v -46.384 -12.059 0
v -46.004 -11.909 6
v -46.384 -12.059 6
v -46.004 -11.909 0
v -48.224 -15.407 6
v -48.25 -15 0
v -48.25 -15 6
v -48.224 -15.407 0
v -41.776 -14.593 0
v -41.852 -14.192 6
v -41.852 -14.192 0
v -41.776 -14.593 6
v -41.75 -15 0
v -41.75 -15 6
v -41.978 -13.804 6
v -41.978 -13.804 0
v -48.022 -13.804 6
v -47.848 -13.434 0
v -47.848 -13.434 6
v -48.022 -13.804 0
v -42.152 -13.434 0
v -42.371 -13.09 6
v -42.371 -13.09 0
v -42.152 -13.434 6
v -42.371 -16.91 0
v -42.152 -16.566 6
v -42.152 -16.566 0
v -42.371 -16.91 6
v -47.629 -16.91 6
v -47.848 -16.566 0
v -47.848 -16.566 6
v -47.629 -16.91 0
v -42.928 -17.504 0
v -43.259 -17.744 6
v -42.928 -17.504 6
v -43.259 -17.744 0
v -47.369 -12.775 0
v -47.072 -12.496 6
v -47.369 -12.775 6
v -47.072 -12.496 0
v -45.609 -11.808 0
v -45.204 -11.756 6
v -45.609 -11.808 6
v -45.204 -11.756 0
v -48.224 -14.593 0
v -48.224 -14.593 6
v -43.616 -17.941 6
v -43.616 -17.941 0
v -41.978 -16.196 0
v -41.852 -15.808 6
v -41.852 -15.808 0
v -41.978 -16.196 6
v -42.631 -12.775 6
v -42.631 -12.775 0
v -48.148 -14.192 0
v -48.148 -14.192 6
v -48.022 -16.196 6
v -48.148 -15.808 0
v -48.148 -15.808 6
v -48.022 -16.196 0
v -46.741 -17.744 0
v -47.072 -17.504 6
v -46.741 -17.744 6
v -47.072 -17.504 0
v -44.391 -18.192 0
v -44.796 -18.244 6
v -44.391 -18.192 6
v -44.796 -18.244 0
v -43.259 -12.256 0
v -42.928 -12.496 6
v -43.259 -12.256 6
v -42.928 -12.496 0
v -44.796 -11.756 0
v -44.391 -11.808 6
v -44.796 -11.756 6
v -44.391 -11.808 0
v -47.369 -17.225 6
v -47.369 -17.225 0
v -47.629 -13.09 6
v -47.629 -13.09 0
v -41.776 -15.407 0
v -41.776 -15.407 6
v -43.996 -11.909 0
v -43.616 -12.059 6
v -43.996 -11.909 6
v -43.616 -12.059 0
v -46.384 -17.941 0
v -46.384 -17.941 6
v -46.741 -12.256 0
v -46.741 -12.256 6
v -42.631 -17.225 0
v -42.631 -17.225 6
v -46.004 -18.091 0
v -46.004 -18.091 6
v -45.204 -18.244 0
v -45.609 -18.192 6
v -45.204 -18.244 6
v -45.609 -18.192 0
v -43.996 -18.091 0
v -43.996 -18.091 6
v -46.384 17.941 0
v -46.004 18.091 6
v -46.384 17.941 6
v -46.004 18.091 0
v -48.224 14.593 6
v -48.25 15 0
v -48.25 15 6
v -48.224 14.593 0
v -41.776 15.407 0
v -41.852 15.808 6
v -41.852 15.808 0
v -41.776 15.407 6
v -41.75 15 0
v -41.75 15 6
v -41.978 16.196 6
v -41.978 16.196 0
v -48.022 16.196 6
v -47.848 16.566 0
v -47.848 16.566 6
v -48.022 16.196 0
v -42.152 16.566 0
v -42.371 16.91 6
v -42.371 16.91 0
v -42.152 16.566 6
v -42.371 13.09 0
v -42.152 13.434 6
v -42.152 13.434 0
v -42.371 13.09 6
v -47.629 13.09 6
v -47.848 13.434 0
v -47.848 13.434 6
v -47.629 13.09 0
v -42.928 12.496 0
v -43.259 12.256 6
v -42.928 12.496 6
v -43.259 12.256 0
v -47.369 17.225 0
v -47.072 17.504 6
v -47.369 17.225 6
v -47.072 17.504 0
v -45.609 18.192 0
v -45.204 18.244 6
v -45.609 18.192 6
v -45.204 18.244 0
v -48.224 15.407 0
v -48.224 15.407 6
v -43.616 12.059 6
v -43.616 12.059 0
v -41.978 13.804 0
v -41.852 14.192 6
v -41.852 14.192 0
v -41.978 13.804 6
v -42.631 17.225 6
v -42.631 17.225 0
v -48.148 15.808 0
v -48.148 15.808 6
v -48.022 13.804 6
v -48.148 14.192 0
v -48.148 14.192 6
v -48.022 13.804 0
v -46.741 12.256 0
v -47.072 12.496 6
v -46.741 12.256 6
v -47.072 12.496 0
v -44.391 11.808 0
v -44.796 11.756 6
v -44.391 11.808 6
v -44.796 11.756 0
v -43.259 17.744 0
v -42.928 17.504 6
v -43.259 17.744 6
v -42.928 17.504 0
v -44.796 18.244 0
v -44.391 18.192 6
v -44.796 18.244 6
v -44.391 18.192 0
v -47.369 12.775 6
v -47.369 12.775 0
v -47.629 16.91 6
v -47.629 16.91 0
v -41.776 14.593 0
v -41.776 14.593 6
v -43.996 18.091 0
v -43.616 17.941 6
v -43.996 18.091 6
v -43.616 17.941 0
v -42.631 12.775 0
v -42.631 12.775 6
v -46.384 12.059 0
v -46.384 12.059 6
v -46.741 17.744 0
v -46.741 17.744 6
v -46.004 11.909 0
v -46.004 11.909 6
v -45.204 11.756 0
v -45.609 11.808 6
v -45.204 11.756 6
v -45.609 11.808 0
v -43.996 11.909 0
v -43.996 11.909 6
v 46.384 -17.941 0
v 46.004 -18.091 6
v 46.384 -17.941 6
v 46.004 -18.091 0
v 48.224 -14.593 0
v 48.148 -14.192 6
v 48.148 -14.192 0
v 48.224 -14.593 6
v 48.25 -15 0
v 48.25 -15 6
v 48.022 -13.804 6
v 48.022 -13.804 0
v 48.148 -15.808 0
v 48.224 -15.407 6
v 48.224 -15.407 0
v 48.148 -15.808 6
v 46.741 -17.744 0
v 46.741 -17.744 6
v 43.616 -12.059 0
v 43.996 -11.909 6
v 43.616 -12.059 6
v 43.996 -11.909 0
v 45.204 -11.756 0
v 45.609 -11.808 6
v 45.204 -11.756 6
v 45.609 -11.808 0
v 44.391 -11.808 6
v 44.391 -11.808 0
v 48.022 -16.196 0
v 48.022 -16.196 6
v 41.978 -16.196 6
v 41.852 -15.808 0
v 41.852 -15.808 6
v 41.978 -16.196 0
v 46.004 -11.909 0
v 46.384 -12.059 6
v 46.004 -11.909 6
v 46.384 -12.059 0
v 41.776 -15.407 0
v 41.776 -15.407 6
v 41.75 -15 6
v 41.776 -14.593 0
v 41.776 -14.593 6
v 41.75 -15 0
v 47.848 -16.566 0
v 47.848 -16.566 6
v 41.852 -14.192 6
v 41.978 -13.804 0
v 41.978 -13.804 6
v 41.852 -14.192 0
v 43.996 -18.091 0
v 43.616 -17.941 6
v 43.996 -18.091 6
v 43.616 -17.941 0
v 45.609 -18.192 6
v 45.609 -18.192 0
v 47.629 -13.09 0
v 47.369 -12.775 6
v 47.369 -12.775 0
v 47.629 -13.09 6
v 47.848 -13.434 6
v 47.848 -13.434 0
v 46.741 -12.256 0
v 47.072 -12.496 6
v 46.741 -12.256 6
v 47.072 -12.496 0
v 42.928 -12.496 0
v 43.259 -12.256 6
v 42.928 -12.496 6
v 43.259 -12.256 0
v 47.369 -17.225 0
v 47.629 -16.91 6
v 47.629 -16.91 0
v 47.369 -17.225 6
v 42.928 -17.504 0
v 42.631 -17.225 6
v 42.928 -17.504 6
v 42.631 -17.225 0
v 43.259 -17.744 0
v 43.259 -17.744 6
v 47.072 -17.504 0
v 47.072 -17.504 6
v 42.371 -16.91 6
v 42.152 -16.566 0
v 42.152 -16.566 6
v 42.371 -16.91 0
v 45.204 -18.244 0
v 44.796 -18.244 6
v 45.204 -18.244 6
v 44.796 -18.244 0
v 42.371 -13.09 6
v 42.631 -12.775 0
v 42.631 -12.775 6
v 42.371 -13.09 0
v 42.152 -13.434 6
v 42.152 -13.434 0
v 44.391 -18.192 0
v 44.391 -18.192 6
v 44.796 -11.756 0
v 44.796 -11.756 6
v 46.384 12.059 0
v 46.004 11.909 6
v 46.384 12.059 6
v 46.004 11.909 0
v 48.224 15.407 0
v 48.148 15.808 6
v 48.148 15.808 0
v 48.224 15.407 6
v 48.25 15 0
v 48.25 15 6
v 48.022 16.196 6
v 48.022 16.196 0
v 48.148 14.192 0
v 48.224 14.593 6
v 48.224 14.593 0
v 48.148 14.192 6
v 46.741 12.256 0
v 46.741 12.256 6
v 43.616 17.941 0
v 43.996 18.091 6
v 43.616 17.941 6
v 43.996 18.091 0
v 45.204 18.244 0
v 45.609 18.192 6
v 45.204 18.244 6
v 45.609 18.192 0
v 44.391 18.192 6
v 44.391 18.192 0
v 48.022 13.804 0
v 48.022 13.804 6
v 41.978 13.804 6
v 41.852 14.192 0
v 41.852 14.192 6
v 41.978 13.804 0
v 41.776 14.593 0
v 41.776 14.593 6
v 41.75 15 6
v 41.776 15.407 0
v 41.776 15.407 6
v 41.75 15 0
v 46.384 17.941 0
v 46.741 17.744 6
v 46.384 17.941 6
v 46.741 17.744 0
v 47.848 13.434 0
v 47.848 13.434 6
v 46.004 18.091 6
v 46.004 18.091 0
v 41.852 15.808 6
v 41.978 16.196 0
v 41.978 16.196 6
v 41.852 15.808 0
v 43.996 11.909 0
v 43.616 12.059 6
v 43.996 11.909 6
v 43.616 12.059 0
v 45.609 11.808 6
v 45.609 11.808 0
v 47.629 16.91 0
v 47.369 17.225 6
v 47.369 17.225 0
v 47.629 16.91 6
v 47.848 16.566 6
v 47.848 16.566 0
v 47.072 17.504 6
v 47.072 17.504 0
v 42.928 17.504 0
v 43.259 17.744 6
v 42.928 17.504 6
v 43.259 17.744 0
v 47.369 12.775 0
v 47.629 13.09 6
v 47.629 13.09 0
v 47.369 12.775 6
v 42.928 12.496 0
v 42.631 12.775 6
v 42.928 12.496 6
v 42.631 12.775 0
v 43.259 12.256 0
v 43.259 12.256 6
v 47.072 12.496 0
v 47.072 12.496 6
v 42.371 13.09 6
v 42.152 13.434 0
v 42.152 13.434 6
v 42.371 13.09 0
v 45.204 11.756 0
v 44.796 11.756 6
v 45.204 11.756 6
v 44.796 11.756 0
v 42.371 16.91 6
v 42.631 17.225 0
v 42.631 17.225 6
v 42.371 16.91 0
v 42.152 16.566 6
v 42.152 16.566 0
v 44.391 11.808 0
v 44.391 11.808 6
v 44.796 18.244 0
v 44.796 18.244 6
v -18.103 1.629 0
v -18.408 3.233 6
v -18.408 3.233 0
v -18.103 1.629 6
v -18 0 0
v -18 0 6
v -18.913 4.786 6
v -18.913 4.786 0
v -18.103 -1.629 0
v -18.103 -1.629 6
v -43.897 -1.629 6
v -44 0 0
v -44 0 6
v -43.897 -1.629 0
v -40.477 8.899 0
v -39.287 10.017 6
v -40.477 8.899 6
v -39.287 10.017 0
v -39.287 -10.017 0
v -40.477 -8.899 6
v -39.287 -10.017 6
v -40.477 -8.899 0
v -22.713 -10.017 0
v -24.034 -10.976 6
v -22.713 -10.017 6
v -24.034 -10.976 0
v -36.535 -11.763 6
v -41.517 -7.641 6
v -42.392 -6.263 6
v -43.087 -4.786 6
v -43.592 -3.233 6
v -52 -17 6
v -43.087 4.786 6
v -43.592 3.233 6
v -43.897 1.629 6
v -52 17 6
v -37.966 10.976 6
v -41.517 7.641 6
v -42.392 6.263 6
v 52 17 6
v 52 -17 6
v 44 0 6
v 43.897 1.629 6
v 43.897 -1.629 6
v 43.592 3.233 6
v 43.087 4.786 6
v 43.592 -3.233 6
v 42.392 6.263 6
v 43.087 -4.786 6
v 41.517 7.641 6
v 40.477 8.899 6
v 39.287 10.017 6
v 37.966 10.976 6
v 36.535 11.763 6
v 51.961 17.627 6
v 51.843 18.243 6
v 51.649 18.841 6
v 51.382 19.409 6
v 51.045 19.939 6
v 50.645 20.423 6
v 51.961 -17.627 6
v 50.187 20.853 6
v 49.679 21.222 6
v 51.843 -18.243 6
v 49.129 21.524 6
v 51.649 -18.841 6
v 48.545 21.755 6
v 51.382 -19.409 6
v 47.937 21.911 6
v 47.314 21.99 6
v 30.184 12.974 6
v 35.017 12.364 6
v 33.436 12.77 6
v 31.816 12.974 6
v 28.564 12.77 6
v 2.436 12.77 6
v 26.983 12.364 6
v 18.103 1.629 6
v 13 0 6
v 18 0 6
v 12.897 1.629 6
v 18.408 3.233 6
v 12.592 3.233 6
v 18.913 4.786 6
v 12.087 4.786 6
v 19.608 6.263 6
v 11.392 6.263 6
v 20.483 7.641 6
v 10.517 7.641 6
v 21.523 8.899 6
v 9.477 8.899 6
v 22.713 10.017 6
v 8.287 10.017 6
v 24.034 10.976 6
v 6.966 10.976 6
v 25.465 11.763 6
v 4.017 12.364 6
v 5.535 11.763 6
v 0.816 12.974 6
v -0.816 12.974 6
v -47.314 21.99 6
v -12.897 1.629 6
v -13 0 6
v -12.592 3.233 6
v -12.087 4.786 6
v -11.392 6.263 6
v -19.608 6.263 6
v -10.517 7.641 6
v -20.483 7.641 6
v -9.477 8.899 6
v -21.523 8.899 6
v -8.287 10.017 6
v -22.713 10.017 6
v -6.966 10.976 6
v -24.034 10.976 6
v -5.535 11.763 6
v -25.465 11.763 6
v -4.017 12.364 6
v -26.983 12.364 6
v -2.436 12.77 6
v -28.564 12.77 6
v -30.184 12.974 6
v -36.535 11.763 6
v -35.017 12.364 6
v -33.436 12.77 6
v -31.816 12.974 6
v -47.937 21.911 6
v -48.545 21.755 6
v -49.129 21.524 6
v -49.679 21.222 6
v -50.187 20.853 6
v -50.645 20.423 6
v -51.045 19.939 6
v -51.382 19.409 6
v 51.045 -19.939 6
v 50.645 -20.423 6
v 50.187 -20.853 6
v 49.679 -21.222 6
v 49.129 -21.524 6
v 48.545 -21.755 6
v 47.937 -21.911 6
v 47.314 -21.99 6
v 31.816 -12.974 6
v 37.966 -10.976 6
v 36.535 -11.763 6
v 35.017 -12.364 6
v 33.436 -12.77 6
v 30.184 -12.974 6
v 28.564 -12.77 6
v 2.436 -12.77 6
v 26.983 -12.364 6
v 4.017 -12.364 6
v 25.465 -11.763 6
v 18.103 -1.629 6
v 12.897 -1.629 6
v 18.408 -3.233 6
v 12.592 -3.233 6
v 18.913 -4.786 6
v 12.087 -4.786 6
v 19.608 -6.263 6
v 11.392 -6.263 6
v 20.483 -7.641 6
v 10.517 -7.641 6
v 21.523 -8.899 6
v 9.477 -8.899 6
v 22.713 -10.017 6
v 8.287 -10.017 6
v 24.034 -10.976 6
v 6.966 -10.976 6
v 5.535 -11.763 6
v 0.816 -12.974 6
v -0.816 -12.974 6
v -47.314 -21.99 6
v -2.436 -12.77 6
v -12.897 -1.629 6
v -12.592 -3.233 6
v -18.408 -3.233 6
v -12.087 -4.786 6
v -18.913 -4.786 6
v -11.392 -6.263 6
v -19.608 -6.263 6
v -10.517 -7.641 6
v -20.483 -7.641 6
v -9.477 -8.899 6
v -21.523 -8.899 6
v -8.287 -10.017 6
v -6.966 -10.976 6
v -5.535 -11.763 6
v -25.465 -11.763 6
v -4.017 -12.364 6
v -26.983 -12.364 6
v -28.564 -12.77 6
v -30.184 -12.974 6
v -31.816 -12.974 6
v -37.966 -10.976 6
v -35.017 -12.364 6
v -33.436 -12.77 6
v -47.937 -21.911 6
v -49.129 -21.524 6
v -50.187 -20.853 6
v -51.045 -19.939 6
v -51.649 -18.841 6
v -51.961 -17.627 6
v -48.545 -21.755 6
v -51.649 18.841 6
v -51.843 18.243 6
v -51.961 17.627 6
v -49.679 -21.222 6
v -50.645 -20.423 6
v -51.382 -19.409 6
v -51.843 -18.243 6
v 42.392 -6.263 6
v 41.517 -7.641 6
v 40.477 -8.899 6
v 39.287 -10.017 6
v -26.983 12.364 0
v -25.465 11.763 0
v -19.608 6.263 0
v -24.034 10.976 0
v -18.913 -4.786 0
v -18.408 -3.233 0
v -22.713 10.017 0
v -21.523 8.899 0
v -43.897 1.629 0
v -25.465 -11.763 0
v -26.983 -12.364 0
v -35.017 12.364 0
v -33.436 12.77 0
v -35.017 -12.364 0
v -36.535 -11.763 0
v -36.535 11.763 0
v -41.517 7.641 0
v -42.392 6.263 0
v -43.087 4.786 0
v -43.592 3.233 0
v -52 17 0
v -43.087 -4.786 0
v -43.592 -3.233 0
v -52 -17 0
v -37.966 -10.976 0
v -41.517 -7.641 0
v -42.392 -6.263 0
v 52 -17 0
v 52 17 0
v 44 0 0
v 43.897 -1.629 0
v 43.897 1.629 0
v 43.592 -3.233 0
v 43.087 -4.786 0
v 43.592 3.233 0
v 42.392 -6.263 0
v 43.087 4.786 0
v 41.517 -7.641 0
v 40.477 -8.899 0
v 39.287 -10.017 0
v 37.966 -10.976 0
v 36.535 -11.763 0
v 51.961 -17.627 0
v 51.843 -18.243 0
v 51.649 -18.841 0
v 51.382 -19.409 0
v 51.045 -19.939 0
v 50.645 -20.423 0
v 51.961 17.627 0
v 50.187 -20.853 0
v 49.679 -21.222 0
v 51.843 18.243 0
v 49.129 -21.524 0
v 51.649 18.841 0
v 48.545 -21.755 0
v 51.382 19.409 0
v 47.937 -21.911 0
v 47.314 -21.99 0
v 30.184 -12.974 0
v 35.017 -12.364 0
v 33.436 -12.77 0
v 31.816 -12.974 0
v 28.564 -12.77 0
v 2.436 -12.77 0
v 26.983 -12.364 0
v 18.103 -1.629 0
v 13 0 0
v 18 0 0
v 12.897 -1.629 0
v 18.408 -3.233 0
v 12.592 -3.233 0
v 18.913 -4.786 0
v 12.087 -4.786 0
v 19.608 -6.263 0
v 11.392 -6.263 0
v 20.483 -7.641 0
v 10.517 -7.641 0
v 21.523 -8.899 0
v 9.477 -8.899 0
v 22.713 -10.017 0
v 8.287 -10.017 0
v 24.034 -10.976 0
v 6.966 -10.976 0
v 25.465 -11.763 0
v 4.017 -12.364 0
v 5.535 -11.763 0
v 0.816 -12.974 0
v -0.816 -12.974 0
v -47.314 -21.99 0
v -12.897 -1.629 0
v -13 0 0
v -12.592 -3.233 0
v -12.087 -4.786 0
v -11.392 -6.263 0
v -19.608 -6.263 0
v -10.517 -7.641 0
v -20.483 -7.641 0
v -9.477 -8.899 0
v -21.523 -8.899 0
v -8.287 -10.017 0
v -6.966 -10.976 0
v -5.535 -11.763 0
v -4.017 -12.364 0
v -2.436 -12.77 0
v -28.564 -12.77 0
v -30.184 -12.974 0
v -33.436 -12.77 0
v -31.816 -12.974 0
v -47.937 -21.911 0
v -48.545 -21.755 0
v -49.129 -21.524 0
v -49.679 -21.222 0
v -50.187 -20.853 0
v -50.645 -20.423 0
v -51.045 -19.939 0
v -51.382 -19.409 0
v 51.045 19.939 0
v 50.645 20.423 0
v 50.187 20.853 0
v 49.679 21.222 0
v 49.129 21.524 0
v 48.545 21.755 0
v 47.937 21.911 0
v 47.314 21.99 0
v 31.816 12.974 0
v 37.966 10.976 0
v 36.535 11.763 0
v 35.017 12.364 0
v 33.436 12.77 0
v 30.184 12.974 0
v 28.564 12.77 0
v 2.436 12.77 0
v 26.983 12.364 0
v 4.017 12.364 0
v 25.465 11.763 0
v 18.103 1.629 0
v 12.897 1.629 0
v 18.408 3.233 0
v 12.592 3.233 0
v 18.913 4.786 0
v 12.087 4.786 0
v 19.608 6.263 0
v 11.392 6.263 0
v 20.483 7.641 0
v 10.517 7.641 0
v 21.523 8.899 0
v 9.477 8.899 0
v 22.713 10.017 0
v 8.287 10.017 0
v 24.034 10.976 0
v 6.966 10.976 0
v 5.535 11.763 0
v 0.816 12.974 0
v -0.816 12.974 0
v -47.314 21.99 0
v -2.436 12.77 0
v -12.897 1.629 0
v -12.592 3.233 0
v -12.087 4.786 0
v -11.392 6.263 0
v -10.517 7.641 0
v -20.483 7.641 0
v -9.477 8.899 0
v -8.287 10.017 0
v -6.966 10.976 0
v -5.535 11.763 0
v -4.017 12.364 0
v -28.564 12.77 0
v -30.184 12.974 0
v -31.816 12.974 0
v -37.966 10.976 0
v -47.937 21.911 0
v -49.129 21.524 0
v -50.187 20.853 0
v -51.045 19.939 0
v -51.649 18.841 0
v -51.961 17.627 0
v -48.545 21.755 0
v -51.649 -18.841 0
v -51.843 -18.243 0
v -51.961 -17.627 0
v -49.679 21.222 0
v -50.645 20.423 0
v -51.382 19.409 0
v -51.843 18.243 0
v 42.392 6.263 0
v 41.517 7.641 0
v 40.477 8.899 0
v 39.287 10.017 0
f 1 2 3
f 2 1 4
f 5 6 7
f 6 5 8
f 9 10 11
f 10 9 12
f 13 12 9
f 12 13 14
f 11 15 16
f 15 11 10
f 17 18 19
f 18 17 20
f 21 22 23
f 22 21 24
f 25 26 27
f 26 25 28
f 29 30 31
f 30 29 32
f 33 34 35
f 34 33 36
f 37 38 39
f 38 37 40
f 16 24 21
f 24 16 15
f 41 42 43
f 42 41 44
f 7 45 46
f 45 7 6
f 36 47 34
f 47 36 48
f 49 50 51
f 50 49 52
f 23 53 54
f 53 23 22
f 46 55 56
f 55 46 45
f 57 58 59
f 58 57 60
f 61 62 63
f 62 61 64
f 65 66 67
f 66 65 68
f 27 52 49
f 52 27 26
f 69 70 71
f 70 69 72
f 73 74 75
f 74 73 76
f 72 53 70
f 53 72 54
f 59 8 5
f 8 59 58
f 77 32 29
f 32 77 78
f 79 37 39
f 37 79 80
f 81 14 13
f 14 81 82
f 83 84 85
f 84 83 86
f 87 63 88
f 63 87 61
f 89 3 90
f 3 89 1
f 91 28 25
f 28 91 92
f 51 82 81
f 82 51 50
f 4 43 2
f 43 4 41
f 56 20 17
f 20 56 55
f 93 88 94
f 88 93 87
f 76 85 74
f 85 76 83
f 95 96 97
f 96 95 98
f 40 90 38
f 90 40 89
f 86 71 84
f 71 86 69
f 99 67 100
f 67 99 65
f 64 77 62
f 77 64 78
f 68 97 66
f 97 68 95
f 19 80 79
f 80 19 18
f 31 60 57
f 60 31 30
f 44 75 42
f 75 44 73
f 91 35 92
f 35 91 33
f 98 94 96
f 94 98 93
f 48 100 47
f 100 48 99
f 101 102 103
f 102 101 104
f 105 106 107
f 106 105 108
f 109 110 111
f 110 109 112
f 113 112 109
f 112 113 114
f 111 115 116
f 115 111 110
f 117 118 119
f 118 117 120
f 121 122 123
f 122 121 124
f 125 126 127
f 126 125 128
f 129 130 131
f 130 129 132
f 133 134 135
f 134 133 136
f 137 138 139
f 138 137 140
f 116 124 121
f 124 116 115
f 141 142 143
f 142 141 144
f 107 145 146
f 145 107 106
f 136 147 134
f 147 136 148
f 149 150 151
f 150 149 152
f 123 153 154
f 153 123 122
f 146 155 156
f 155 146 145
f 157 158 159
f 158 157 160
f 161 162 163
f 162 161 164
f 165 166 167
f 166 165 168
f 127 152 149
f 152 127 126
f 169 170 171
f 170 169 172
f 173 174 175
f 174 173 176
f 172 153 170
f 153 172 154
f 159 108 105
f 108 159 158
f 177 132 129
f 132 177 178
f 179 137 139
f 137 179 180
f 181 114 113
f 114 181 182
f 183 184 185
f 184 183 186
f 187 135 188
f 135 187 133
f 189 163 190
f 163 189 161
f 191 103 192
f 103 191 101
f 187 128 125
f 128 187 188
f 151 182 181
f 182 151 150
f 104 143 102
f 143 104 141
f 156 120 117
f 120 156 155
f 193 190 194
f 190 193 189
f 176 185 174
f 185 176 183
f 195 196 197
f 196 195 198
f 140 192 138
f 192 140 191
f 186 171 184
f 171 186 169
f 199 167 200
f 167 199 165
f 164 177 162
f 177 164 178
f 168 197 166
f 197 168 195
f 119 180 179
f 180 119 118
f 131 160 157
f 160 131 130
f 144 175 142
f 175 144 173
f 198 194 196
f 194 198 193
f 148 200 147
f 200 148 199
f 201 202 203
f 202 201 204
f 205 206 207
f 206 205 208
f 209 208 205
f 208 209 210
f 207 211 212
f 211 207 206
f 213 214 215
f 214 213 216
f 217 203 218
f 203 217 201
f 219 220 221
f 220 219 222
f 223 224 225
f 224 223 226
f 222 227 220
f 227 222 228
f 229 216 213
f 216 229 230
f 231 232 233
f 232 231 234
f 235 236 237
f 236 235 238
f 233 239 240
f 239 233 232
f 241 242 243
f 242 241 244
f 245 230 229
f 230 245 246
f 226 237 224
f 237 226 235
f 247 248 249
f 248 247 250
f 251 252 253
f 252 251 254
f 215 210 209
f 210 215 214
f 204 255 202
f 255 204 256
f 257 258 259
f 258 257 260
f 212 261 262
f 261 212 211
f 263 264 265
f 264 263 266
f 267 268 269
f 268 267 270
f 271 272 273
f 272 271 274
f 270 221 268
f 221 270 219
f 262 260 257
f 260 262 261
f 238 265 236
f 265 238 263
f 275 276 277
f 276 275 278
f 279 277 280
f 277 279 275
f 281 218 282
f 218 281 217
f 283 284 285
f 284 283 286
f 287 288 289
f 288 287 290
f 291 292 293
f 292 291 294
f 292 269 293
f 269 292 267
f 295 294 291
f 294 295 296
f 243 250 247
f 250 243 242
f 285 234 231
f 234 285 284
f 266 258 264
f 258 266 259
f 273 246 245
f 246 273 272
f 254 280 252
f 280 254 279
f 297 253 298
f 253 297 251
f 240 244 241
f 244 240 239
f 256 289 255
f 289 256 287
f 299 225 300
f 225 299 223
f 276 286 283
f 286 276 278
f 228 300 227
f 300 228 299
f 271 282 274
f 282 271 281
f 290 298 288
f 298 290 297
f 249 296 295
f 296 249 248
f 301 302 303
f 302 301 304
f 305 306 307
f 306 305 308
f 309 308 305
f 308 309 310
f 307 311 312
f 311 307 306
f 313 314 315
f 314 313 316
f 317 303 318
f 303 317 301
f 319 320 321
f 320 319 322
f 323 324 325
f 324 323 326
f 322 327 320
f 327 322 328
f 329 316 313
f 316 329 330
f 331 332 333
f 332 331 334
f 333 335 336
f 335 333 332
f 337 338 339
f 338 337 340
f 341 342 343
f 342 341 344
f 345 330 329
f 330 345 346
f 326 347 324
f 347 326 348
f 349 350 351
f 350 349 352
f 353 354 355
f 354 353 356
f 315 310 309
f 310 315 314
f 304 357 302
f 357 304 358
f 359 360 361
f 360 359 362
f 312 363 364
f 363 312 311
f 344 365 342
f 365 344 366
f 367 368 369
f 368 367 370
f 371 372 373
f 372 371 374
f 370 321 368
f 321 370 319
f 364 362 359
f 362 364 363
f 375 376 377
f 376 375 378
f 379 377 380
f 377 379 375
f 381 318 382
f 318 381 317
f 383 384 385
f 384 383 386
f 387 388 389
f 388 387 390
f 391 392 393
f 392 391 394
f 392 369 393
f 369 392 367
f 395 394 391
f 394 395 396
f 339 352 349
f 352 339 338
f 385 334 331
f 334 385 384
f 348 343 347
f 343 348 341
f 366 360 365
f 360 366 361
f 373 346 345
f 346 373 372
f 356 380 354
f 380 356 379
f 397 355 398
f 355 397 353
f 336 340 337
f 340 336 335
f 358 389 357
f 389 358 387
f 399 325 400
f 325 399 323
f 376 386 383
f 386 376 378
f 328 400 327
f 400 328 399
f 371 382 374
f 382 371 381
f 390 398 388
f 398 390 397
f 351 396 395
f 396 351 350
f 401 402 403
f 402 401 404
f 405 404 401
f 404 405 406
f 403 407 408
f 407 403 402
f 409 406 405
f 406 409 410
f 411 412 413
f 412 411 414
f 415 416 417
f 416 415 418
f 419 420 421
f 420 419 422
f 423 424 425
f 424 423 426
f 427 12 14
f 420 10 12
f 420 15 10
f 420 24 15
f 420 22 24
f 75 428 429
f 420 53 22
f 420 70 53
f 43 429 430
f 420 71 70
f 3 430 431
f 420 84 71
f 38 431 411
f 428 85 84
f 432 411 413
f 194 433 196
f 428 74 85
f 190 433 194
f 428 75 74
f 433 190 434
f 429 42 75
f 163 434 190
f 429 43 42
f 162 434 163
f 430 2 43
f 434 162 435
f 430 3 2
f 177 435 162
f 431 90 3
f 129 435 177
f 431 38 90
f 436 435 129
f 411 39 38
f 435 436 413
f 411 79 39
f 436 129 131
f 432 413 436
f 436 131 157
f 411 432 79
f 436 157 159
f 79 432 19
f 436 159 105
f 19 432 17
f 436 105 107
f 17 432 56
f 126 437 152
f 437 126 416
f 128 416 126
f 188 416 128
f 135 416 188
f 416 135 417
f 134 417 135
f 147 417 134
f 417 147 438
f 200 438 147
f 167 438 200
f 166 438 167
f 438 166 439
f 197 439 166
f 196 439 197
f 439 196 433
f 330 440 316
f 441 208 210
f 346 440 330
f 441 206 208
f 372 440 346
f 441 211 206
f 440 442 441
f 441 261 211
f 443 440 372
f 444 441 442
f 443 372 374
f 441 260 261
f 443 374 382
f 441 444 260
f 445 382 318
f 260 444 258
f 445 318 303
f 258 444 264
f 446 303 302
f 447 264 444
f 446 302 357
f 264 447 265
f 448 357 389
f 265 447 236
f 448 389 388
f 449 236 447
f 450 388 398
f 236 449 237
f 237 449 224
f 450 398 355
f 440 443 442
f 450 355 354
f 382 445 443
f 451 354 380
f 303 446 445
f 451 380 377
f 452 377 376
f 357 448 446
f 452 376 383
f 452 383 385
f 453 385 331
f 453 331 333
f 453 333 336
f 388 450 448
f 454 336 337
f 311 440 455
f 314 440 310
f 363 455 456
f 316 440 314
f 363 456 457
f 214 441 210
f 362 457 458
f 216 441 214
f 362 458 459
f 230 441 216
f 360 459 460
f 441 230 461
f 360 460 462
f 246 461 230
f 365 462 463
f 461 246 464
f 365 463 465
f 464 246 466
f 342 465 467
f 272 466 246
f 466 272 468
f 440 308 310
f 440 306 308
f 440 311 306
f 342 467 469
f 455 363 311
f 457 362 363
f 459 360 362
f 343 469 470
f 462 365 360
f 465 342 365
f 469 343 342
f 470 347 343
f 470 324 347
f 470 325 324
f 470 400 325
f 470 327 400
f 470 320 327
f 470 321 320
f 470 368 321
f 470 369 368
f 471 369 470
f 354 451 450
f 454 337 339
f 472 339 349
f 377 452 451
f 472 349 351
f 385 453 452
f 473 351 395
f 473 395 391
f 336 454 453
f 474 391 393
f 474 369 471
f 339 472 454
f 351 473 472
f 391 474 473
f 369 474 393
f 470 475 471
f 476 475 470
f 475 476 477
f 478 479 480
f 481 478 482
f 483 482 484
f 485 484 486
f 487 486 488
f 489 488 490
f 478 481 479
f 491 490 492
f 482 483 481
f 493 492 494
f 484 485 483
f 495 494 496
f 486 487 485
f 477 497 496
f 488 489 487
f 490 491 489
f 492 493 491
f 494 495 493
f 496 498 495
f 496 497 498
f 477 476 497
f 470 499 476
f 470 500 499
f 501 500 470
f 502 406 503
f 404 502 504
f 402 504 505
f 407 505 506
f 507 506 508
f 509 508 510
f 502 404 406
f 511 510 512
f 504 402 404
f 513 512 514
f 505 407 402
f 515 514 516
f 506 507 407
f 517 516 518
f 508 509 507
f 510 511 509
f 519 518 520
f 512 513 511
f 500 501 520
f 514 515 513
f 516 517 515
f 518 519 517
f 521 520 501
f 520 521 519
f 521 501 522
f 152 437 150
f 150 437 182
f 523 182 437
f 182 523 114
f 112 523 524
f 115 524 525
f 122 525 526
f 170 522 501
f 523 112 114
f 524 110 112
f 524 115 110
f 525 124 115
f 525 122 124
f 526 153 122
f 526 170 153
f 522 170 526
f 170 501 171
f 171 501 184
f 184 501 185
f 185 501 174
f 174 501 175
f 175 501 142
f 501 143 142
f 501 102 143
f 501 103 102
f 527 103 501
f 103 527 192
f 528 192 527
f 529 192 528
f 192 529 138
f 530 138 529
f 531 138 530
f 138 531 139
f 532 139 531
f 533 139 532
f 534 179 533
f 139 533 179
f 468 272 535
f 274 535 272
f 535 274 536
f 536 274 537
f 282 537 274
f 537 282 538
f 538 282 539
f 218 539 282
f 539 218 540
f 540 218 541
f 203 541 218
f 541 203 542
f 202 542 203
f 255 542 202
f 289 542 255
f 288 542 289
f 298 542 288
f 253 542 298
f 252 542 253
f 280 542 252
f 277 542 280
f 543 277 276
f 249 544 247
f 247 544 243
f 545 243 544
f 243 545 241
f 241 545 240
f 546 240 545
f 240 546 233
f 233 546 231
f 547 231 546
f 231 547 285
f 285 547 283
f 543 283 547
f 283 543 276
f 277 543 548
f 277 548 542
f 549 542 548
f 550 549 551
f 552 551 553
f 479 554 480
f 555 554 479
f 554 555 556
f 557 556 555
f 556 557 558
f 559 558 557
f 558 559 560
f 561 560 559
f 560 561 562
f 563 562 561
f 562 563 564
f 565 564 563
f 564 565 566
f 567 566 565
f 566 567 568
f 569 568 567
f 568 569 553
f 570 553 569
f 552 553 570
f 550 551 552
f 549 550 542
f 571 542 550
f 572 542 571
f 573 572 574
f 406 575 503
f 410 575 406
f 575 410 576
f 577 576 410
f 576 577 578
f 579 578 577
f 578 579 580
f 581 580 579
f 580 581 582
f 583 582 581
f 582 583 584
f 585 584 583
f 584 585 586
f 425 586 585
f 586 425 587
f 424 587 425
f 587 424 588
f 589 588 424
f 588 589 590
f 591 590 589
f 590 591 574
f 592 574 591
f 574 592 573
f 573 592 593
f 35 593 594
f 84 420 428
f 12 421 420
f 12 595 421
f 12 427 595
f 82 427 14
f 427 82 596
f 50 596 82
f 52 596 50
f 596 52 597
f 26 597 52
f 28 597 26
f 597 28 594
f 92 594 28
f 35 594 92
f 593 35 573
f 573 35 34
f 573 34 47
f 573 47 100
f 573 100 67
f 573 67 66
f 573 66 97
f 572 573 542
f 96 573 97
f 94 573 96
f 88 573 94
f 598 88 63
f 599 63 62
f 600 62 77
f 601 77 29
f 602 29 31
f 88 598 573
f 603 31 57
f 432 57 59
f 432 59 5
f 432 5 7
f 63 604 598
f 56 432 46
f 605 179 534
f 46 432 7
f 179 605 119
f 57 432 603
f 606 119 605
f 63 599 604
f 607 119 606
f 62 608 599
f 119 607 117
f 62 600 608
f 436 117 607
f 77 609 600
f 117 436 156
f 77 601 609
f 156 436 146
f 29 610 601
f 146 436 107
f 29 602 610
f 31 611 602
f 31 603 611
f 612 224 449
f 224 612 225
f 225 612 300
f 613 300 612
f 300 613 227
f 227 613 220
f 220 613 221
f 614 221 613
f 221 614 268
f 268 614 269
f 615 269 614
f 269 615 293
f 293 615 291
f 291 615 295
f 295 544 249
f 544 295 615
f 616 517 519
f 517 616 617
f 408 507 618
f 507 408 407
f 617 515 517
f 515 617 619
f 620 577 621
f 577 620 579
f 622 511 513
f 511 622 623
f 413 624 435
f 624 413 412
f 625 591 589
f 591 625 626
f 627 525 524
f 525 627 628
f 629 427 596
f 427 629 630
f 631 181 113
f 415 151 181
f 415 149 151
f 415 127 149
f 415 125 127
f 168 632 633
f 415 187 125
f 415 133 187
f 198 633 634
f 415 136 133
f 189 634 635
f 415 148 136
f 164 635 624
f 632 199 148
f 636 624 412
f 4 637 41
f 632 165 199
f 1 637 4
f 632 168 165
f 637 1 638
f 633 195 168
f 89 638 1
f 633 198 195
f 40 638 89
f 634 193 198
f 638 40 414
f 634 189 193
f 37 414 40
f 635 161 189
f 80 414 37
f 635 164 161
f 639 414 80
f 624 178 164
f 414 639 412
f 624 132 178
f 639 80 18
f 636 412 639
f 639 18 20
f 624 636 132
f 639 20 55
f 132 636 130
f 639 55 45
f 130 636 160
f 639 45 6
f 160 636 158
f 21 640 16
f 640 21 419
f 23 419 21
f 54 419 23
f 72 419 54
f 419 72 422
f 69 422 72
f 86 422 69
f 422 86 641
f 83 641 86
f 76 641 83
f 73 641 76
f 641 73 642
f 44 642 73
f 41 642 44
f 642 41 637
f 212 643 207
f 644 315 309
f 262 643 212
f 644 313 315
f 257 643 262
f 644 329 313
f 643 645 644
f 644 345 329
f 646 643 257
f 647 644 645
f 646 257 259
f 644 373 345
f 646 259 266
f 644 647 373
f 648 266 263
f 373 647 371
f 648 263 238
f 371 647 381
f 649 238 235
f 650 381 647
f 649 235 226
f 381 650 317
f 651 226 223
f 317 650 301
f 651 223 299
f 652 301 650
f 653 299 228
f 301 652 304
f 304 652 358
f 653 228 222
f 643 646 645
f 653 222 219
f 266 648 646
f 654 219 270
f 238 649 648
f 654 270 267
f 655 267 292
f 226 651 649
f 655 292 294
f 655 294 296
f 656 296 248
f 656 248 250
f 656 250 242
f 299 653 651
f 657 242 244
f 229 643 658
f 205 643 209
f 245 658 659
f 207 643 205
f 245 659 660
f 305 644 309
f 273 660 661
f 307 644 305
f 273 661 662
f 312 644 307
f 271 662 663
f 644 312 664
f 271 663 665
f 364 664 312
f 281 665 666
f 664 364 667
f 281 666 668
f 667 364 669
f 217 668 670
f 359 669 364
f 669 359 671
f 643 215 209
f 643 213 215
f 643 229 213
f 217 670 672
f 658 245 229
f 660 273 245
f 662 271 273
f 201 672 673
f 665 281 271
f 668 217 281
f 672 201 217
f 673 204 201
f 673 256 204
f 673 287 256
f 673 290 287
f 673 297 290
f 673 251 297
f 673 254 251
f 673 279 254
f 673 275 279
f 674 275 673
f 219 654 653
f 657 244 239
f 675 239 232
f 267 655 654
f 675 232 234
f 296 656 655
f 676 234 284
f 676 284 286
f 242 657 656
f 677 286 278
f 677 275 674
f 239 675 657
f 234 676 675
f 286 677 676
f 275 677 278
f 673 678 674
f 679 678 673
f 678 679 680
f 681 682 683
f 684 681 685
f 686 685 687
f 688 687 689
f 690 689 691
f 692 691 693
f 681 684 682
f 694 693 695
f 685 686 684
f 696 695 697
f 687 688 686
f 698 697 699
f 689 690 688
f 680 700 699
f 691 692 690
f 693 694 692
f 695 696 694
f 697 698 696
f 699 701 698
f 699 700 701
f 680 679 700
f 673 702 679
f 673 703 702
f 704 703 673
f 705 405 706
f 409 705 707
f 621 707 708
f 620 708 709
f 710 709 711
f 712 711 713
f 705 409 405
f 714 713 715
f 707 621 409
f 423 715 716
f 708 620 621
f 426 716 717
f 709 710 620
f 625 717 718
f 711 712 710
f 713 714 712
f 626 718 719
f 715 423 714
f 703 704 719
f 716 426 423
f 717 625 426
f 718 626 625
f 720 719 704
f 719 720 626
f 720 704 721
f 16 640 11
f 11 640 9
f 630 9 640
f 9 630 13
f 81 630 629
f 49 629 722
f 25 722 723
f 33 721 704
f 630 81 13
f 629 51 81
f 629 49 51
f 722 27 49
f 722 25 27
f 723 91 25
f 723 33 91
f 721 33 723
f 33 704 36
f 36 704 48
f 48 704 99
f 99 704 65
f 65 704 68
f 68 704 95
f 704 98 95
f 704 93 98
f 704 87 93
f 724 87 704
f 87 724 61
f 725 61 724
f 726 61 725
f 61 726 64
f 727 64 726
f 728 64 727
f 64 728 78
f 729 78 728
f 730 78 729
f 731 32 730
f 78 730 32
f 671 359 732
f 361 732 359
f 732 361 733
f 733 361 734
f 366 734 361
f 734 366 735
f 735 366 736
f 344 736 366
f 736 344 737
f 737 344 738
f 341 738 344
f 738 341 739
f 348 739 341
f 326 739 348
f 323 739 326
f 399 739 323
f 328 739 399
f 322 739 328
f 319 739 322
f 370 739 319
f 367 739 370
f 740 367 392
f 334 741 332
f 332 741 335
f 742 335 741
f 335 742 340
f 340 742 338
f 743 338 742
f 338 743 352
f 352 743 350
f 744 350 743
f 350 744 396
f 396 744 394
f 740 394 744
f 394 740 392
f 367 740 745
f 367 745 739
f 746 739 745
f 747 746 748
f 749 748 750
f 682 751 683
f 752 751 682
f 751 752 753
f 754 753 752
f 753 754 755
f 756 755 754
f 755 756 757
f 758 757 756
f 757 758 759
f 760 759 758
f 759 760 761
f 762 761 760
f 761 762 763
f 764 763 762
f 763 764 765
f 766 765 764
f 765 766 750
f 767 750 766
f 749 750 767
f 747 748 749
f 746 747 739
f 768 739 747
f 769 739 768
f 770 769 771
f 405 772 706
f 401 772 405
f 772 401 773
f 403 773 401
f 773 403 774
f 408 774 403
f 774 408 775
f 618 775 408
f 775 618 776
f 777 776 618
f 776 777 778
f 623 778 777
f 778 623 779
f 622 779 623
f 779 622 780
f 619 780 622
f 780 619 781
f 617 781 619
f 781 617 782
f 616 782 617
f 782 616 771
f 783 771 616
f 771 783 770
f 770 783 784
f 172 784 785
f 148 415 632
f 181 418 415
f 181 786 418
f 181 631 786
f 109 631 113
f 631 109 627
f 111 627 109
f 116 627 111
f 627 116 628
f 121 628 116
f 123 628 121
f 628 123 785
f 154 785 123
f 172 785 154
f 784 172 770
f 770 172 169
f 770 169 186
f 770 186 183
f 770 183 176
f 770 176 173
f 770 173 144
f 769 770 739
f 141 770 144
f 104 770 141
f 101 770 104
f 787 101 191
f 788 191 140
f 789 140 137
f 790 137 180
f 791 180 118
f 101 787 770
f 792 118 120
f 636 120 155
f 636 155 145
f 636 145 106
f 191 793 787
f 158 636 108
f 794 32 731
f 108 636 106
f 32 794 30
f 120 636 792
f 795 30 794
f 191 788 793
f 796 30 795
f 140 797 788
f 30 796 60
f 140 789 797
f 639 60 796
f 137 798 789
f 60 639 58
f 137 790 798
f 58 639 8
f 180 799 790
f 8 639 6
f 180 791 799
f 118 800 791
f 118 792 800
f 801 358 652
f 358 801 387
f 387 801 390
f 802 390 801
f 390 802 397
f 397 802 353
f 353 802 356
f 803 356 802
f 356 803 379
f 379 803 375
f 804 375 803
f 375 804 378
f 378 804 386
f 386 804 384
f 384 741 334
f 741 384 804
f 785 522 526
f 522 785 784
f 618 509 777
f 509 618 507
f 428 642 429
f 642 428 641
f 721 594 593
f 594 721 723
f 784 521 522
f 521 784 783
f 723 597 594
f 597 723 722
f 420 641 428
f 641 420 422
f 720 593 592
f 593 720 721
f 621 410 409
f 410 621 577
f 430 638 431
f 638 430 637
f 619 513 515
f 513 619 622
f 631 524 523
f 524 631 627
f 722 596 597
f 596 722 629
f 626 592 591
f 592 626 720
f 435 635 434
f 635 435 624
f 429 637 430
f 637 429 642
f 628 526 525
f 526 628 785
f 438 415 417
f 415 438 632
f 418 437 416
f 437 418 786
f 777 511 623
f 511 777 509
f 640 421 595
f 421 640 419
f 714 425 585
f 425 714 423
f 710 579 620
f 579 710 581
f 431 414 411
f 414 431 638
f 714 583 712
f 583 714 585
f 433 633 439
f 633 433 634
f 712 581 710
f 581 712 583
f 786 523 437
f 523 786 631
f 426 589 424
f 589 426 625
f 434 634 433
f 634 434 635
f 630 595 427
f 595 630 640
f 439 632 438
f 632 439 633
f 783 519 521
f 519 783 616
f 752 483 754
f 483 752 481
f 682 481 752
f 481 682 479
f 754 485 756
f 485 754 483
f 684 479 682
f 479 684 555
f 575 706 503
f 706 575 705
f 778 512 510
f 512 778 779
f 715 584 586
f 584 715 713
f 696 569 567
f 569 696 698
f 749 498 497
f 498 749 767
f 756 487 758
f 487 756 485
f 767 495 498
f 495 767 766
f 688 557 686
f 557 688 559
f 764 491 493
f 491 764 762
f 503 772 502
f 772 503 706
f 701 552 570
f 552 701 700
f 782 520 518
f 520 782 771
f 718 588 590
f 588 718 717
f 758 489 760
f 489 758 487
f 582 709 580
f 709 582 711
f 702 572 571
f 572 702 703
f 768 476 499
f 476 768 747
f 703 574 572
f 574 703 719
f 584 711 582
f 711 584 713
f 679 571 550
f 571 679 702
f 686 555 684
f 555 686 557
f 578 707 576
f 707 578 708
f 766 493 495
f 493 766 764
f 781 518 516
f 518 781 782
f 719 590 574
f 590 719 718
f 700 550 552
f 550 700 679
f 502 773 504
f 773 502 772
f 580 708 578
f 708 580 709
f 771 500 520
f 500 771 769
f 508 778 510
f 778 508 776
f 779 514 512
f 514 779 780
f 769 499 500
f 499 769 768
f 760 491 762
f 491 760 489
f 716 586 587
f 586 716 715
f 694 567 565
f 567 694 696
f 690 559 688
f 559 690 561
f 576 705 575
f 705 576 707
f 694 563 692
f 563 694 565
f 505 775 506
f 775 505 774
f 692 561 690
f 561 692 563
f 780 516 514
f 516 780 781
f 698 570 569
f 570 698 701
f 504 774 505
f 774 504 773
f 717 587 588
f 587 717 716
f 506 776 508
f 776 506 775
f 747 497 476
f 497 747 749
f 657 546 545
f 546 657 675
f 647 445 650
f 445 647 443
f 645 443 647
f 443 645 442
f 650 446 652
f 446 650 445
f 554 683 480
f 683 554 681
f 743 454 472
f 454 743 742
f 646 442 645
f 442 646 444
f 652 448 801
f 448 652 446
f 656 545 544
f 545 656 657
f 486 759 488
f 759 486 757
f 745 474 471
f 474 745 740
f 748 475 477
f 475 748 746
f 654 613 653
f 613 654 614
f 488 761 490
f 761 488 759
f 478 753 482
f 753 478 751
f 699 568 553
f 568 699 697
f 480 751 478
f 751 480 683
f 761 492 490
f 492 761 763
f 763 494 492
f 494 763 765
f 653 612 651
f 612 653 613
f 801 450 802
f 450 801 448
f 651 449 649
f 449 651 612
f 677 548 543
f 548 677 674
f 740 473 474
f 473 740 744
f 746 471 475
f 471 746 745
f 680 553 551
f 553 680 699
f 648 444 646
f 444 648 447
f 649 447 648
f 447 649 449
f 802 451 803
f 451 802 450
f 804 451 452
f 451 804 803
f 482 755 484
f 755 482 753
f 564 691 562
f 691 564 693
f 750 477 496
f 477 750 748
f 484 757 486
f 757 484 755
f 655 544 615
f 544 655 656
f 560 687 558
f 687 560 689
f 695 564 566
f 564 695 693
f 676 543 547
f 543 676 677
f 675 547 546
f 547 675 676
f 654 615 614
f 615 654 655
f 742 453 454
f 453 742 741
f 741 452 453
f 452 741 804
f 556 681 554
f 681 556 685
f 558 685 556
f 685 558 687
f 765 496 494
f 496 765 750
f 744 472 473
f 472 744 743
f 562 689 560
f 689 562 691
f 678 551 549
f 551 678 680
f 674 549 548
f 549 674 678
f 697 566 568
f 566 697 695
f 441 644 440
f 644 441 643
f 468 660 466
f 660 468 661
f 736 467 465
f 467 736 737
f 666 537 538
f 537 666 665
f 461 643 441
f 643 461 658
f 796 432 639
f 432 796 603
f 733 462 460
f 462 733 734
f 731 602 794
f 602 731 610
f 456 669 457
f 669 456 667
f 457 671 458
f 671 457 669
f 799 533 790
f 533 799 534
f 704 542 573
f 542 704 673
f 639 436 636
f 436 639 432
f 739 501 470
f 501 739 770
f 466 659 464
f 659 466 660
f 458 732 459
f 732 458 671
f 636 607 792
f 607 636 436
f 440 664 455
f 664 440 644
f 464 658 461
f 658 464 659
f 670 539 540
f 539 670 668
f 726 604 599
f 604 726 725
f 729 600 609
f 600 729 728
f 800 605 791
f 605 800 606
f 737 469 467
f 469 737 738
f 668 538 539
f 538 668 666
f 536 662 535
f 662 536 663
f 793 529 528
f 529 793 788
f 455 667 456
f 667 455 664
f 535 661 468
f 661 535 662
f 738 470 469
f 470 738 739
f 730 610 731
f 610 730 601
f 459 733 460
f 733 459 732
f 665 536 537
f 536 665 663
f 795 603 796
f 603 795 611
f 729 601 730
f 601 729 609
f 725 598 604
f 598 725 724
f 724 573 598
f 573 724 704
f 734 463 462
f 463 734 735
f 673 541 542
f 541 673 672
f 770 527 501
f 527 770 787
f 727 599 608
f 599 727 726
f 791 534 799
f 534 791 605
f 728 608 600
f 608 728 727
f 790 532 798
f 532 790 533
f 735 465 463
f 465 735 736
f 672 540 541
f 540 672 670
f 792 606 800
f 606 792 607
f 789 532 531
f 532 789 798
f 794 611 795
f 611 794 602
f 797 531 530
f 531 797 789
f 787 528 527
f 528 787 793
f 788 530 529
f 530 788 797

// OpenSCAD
$fn = 50;


difference() {
	union() {
		hull() {
			translate(v = [-47.0000000000, 17.0000000000, 0]) {
				cylinder(h = 6, r = 5);
			}
			translate(v = [47.0000000000, 17.0000000000, 0]) {
				cylinder(h = 6, r = 5);
			}
			translate(v = [-47.0000000000, -17.0000000000, 0]) {
				cylinder(h = 6, r = 5);
			}
			translate(v = [47.0000000000, -17.0000000000, 0]) {
				cylinder(h = 6, r = 5);
			}
		}
	}
	union() {
		#translate(v = [-45.0000000000, -15.0000000000, -100.0000000000]) {
			cylinder(h = 200, r = 3.2500000000);
		}
		#translate(v = [-45.0000000000, 15.0000000000, -100.0000000000]) {
			cylinder(h = 200, r = 3.2500000000);
		}
		#translate(v = [45.0000000000, -15.0000000000, -100.0000000000]) {
			cylinder(h = 200, r = 3.2500000000);
		}
		#translate(v = [45.0000000000, 15.0000000000, -100.0000000000]) {
			cylinder(h = 200, r = 3.2500000000);
		}
		#translate(v = [-31.0000000000, 0, 0]) {
			cylinder(h = 6, r = 13.0000000000);
		}
		#cylinder(h = 6, r = 13.0000000000);
		#translate(v = [31.0000000000, 0, 0]) {
			cylinder(h = 6, r = 13.0000000000);
		}
	}
}
